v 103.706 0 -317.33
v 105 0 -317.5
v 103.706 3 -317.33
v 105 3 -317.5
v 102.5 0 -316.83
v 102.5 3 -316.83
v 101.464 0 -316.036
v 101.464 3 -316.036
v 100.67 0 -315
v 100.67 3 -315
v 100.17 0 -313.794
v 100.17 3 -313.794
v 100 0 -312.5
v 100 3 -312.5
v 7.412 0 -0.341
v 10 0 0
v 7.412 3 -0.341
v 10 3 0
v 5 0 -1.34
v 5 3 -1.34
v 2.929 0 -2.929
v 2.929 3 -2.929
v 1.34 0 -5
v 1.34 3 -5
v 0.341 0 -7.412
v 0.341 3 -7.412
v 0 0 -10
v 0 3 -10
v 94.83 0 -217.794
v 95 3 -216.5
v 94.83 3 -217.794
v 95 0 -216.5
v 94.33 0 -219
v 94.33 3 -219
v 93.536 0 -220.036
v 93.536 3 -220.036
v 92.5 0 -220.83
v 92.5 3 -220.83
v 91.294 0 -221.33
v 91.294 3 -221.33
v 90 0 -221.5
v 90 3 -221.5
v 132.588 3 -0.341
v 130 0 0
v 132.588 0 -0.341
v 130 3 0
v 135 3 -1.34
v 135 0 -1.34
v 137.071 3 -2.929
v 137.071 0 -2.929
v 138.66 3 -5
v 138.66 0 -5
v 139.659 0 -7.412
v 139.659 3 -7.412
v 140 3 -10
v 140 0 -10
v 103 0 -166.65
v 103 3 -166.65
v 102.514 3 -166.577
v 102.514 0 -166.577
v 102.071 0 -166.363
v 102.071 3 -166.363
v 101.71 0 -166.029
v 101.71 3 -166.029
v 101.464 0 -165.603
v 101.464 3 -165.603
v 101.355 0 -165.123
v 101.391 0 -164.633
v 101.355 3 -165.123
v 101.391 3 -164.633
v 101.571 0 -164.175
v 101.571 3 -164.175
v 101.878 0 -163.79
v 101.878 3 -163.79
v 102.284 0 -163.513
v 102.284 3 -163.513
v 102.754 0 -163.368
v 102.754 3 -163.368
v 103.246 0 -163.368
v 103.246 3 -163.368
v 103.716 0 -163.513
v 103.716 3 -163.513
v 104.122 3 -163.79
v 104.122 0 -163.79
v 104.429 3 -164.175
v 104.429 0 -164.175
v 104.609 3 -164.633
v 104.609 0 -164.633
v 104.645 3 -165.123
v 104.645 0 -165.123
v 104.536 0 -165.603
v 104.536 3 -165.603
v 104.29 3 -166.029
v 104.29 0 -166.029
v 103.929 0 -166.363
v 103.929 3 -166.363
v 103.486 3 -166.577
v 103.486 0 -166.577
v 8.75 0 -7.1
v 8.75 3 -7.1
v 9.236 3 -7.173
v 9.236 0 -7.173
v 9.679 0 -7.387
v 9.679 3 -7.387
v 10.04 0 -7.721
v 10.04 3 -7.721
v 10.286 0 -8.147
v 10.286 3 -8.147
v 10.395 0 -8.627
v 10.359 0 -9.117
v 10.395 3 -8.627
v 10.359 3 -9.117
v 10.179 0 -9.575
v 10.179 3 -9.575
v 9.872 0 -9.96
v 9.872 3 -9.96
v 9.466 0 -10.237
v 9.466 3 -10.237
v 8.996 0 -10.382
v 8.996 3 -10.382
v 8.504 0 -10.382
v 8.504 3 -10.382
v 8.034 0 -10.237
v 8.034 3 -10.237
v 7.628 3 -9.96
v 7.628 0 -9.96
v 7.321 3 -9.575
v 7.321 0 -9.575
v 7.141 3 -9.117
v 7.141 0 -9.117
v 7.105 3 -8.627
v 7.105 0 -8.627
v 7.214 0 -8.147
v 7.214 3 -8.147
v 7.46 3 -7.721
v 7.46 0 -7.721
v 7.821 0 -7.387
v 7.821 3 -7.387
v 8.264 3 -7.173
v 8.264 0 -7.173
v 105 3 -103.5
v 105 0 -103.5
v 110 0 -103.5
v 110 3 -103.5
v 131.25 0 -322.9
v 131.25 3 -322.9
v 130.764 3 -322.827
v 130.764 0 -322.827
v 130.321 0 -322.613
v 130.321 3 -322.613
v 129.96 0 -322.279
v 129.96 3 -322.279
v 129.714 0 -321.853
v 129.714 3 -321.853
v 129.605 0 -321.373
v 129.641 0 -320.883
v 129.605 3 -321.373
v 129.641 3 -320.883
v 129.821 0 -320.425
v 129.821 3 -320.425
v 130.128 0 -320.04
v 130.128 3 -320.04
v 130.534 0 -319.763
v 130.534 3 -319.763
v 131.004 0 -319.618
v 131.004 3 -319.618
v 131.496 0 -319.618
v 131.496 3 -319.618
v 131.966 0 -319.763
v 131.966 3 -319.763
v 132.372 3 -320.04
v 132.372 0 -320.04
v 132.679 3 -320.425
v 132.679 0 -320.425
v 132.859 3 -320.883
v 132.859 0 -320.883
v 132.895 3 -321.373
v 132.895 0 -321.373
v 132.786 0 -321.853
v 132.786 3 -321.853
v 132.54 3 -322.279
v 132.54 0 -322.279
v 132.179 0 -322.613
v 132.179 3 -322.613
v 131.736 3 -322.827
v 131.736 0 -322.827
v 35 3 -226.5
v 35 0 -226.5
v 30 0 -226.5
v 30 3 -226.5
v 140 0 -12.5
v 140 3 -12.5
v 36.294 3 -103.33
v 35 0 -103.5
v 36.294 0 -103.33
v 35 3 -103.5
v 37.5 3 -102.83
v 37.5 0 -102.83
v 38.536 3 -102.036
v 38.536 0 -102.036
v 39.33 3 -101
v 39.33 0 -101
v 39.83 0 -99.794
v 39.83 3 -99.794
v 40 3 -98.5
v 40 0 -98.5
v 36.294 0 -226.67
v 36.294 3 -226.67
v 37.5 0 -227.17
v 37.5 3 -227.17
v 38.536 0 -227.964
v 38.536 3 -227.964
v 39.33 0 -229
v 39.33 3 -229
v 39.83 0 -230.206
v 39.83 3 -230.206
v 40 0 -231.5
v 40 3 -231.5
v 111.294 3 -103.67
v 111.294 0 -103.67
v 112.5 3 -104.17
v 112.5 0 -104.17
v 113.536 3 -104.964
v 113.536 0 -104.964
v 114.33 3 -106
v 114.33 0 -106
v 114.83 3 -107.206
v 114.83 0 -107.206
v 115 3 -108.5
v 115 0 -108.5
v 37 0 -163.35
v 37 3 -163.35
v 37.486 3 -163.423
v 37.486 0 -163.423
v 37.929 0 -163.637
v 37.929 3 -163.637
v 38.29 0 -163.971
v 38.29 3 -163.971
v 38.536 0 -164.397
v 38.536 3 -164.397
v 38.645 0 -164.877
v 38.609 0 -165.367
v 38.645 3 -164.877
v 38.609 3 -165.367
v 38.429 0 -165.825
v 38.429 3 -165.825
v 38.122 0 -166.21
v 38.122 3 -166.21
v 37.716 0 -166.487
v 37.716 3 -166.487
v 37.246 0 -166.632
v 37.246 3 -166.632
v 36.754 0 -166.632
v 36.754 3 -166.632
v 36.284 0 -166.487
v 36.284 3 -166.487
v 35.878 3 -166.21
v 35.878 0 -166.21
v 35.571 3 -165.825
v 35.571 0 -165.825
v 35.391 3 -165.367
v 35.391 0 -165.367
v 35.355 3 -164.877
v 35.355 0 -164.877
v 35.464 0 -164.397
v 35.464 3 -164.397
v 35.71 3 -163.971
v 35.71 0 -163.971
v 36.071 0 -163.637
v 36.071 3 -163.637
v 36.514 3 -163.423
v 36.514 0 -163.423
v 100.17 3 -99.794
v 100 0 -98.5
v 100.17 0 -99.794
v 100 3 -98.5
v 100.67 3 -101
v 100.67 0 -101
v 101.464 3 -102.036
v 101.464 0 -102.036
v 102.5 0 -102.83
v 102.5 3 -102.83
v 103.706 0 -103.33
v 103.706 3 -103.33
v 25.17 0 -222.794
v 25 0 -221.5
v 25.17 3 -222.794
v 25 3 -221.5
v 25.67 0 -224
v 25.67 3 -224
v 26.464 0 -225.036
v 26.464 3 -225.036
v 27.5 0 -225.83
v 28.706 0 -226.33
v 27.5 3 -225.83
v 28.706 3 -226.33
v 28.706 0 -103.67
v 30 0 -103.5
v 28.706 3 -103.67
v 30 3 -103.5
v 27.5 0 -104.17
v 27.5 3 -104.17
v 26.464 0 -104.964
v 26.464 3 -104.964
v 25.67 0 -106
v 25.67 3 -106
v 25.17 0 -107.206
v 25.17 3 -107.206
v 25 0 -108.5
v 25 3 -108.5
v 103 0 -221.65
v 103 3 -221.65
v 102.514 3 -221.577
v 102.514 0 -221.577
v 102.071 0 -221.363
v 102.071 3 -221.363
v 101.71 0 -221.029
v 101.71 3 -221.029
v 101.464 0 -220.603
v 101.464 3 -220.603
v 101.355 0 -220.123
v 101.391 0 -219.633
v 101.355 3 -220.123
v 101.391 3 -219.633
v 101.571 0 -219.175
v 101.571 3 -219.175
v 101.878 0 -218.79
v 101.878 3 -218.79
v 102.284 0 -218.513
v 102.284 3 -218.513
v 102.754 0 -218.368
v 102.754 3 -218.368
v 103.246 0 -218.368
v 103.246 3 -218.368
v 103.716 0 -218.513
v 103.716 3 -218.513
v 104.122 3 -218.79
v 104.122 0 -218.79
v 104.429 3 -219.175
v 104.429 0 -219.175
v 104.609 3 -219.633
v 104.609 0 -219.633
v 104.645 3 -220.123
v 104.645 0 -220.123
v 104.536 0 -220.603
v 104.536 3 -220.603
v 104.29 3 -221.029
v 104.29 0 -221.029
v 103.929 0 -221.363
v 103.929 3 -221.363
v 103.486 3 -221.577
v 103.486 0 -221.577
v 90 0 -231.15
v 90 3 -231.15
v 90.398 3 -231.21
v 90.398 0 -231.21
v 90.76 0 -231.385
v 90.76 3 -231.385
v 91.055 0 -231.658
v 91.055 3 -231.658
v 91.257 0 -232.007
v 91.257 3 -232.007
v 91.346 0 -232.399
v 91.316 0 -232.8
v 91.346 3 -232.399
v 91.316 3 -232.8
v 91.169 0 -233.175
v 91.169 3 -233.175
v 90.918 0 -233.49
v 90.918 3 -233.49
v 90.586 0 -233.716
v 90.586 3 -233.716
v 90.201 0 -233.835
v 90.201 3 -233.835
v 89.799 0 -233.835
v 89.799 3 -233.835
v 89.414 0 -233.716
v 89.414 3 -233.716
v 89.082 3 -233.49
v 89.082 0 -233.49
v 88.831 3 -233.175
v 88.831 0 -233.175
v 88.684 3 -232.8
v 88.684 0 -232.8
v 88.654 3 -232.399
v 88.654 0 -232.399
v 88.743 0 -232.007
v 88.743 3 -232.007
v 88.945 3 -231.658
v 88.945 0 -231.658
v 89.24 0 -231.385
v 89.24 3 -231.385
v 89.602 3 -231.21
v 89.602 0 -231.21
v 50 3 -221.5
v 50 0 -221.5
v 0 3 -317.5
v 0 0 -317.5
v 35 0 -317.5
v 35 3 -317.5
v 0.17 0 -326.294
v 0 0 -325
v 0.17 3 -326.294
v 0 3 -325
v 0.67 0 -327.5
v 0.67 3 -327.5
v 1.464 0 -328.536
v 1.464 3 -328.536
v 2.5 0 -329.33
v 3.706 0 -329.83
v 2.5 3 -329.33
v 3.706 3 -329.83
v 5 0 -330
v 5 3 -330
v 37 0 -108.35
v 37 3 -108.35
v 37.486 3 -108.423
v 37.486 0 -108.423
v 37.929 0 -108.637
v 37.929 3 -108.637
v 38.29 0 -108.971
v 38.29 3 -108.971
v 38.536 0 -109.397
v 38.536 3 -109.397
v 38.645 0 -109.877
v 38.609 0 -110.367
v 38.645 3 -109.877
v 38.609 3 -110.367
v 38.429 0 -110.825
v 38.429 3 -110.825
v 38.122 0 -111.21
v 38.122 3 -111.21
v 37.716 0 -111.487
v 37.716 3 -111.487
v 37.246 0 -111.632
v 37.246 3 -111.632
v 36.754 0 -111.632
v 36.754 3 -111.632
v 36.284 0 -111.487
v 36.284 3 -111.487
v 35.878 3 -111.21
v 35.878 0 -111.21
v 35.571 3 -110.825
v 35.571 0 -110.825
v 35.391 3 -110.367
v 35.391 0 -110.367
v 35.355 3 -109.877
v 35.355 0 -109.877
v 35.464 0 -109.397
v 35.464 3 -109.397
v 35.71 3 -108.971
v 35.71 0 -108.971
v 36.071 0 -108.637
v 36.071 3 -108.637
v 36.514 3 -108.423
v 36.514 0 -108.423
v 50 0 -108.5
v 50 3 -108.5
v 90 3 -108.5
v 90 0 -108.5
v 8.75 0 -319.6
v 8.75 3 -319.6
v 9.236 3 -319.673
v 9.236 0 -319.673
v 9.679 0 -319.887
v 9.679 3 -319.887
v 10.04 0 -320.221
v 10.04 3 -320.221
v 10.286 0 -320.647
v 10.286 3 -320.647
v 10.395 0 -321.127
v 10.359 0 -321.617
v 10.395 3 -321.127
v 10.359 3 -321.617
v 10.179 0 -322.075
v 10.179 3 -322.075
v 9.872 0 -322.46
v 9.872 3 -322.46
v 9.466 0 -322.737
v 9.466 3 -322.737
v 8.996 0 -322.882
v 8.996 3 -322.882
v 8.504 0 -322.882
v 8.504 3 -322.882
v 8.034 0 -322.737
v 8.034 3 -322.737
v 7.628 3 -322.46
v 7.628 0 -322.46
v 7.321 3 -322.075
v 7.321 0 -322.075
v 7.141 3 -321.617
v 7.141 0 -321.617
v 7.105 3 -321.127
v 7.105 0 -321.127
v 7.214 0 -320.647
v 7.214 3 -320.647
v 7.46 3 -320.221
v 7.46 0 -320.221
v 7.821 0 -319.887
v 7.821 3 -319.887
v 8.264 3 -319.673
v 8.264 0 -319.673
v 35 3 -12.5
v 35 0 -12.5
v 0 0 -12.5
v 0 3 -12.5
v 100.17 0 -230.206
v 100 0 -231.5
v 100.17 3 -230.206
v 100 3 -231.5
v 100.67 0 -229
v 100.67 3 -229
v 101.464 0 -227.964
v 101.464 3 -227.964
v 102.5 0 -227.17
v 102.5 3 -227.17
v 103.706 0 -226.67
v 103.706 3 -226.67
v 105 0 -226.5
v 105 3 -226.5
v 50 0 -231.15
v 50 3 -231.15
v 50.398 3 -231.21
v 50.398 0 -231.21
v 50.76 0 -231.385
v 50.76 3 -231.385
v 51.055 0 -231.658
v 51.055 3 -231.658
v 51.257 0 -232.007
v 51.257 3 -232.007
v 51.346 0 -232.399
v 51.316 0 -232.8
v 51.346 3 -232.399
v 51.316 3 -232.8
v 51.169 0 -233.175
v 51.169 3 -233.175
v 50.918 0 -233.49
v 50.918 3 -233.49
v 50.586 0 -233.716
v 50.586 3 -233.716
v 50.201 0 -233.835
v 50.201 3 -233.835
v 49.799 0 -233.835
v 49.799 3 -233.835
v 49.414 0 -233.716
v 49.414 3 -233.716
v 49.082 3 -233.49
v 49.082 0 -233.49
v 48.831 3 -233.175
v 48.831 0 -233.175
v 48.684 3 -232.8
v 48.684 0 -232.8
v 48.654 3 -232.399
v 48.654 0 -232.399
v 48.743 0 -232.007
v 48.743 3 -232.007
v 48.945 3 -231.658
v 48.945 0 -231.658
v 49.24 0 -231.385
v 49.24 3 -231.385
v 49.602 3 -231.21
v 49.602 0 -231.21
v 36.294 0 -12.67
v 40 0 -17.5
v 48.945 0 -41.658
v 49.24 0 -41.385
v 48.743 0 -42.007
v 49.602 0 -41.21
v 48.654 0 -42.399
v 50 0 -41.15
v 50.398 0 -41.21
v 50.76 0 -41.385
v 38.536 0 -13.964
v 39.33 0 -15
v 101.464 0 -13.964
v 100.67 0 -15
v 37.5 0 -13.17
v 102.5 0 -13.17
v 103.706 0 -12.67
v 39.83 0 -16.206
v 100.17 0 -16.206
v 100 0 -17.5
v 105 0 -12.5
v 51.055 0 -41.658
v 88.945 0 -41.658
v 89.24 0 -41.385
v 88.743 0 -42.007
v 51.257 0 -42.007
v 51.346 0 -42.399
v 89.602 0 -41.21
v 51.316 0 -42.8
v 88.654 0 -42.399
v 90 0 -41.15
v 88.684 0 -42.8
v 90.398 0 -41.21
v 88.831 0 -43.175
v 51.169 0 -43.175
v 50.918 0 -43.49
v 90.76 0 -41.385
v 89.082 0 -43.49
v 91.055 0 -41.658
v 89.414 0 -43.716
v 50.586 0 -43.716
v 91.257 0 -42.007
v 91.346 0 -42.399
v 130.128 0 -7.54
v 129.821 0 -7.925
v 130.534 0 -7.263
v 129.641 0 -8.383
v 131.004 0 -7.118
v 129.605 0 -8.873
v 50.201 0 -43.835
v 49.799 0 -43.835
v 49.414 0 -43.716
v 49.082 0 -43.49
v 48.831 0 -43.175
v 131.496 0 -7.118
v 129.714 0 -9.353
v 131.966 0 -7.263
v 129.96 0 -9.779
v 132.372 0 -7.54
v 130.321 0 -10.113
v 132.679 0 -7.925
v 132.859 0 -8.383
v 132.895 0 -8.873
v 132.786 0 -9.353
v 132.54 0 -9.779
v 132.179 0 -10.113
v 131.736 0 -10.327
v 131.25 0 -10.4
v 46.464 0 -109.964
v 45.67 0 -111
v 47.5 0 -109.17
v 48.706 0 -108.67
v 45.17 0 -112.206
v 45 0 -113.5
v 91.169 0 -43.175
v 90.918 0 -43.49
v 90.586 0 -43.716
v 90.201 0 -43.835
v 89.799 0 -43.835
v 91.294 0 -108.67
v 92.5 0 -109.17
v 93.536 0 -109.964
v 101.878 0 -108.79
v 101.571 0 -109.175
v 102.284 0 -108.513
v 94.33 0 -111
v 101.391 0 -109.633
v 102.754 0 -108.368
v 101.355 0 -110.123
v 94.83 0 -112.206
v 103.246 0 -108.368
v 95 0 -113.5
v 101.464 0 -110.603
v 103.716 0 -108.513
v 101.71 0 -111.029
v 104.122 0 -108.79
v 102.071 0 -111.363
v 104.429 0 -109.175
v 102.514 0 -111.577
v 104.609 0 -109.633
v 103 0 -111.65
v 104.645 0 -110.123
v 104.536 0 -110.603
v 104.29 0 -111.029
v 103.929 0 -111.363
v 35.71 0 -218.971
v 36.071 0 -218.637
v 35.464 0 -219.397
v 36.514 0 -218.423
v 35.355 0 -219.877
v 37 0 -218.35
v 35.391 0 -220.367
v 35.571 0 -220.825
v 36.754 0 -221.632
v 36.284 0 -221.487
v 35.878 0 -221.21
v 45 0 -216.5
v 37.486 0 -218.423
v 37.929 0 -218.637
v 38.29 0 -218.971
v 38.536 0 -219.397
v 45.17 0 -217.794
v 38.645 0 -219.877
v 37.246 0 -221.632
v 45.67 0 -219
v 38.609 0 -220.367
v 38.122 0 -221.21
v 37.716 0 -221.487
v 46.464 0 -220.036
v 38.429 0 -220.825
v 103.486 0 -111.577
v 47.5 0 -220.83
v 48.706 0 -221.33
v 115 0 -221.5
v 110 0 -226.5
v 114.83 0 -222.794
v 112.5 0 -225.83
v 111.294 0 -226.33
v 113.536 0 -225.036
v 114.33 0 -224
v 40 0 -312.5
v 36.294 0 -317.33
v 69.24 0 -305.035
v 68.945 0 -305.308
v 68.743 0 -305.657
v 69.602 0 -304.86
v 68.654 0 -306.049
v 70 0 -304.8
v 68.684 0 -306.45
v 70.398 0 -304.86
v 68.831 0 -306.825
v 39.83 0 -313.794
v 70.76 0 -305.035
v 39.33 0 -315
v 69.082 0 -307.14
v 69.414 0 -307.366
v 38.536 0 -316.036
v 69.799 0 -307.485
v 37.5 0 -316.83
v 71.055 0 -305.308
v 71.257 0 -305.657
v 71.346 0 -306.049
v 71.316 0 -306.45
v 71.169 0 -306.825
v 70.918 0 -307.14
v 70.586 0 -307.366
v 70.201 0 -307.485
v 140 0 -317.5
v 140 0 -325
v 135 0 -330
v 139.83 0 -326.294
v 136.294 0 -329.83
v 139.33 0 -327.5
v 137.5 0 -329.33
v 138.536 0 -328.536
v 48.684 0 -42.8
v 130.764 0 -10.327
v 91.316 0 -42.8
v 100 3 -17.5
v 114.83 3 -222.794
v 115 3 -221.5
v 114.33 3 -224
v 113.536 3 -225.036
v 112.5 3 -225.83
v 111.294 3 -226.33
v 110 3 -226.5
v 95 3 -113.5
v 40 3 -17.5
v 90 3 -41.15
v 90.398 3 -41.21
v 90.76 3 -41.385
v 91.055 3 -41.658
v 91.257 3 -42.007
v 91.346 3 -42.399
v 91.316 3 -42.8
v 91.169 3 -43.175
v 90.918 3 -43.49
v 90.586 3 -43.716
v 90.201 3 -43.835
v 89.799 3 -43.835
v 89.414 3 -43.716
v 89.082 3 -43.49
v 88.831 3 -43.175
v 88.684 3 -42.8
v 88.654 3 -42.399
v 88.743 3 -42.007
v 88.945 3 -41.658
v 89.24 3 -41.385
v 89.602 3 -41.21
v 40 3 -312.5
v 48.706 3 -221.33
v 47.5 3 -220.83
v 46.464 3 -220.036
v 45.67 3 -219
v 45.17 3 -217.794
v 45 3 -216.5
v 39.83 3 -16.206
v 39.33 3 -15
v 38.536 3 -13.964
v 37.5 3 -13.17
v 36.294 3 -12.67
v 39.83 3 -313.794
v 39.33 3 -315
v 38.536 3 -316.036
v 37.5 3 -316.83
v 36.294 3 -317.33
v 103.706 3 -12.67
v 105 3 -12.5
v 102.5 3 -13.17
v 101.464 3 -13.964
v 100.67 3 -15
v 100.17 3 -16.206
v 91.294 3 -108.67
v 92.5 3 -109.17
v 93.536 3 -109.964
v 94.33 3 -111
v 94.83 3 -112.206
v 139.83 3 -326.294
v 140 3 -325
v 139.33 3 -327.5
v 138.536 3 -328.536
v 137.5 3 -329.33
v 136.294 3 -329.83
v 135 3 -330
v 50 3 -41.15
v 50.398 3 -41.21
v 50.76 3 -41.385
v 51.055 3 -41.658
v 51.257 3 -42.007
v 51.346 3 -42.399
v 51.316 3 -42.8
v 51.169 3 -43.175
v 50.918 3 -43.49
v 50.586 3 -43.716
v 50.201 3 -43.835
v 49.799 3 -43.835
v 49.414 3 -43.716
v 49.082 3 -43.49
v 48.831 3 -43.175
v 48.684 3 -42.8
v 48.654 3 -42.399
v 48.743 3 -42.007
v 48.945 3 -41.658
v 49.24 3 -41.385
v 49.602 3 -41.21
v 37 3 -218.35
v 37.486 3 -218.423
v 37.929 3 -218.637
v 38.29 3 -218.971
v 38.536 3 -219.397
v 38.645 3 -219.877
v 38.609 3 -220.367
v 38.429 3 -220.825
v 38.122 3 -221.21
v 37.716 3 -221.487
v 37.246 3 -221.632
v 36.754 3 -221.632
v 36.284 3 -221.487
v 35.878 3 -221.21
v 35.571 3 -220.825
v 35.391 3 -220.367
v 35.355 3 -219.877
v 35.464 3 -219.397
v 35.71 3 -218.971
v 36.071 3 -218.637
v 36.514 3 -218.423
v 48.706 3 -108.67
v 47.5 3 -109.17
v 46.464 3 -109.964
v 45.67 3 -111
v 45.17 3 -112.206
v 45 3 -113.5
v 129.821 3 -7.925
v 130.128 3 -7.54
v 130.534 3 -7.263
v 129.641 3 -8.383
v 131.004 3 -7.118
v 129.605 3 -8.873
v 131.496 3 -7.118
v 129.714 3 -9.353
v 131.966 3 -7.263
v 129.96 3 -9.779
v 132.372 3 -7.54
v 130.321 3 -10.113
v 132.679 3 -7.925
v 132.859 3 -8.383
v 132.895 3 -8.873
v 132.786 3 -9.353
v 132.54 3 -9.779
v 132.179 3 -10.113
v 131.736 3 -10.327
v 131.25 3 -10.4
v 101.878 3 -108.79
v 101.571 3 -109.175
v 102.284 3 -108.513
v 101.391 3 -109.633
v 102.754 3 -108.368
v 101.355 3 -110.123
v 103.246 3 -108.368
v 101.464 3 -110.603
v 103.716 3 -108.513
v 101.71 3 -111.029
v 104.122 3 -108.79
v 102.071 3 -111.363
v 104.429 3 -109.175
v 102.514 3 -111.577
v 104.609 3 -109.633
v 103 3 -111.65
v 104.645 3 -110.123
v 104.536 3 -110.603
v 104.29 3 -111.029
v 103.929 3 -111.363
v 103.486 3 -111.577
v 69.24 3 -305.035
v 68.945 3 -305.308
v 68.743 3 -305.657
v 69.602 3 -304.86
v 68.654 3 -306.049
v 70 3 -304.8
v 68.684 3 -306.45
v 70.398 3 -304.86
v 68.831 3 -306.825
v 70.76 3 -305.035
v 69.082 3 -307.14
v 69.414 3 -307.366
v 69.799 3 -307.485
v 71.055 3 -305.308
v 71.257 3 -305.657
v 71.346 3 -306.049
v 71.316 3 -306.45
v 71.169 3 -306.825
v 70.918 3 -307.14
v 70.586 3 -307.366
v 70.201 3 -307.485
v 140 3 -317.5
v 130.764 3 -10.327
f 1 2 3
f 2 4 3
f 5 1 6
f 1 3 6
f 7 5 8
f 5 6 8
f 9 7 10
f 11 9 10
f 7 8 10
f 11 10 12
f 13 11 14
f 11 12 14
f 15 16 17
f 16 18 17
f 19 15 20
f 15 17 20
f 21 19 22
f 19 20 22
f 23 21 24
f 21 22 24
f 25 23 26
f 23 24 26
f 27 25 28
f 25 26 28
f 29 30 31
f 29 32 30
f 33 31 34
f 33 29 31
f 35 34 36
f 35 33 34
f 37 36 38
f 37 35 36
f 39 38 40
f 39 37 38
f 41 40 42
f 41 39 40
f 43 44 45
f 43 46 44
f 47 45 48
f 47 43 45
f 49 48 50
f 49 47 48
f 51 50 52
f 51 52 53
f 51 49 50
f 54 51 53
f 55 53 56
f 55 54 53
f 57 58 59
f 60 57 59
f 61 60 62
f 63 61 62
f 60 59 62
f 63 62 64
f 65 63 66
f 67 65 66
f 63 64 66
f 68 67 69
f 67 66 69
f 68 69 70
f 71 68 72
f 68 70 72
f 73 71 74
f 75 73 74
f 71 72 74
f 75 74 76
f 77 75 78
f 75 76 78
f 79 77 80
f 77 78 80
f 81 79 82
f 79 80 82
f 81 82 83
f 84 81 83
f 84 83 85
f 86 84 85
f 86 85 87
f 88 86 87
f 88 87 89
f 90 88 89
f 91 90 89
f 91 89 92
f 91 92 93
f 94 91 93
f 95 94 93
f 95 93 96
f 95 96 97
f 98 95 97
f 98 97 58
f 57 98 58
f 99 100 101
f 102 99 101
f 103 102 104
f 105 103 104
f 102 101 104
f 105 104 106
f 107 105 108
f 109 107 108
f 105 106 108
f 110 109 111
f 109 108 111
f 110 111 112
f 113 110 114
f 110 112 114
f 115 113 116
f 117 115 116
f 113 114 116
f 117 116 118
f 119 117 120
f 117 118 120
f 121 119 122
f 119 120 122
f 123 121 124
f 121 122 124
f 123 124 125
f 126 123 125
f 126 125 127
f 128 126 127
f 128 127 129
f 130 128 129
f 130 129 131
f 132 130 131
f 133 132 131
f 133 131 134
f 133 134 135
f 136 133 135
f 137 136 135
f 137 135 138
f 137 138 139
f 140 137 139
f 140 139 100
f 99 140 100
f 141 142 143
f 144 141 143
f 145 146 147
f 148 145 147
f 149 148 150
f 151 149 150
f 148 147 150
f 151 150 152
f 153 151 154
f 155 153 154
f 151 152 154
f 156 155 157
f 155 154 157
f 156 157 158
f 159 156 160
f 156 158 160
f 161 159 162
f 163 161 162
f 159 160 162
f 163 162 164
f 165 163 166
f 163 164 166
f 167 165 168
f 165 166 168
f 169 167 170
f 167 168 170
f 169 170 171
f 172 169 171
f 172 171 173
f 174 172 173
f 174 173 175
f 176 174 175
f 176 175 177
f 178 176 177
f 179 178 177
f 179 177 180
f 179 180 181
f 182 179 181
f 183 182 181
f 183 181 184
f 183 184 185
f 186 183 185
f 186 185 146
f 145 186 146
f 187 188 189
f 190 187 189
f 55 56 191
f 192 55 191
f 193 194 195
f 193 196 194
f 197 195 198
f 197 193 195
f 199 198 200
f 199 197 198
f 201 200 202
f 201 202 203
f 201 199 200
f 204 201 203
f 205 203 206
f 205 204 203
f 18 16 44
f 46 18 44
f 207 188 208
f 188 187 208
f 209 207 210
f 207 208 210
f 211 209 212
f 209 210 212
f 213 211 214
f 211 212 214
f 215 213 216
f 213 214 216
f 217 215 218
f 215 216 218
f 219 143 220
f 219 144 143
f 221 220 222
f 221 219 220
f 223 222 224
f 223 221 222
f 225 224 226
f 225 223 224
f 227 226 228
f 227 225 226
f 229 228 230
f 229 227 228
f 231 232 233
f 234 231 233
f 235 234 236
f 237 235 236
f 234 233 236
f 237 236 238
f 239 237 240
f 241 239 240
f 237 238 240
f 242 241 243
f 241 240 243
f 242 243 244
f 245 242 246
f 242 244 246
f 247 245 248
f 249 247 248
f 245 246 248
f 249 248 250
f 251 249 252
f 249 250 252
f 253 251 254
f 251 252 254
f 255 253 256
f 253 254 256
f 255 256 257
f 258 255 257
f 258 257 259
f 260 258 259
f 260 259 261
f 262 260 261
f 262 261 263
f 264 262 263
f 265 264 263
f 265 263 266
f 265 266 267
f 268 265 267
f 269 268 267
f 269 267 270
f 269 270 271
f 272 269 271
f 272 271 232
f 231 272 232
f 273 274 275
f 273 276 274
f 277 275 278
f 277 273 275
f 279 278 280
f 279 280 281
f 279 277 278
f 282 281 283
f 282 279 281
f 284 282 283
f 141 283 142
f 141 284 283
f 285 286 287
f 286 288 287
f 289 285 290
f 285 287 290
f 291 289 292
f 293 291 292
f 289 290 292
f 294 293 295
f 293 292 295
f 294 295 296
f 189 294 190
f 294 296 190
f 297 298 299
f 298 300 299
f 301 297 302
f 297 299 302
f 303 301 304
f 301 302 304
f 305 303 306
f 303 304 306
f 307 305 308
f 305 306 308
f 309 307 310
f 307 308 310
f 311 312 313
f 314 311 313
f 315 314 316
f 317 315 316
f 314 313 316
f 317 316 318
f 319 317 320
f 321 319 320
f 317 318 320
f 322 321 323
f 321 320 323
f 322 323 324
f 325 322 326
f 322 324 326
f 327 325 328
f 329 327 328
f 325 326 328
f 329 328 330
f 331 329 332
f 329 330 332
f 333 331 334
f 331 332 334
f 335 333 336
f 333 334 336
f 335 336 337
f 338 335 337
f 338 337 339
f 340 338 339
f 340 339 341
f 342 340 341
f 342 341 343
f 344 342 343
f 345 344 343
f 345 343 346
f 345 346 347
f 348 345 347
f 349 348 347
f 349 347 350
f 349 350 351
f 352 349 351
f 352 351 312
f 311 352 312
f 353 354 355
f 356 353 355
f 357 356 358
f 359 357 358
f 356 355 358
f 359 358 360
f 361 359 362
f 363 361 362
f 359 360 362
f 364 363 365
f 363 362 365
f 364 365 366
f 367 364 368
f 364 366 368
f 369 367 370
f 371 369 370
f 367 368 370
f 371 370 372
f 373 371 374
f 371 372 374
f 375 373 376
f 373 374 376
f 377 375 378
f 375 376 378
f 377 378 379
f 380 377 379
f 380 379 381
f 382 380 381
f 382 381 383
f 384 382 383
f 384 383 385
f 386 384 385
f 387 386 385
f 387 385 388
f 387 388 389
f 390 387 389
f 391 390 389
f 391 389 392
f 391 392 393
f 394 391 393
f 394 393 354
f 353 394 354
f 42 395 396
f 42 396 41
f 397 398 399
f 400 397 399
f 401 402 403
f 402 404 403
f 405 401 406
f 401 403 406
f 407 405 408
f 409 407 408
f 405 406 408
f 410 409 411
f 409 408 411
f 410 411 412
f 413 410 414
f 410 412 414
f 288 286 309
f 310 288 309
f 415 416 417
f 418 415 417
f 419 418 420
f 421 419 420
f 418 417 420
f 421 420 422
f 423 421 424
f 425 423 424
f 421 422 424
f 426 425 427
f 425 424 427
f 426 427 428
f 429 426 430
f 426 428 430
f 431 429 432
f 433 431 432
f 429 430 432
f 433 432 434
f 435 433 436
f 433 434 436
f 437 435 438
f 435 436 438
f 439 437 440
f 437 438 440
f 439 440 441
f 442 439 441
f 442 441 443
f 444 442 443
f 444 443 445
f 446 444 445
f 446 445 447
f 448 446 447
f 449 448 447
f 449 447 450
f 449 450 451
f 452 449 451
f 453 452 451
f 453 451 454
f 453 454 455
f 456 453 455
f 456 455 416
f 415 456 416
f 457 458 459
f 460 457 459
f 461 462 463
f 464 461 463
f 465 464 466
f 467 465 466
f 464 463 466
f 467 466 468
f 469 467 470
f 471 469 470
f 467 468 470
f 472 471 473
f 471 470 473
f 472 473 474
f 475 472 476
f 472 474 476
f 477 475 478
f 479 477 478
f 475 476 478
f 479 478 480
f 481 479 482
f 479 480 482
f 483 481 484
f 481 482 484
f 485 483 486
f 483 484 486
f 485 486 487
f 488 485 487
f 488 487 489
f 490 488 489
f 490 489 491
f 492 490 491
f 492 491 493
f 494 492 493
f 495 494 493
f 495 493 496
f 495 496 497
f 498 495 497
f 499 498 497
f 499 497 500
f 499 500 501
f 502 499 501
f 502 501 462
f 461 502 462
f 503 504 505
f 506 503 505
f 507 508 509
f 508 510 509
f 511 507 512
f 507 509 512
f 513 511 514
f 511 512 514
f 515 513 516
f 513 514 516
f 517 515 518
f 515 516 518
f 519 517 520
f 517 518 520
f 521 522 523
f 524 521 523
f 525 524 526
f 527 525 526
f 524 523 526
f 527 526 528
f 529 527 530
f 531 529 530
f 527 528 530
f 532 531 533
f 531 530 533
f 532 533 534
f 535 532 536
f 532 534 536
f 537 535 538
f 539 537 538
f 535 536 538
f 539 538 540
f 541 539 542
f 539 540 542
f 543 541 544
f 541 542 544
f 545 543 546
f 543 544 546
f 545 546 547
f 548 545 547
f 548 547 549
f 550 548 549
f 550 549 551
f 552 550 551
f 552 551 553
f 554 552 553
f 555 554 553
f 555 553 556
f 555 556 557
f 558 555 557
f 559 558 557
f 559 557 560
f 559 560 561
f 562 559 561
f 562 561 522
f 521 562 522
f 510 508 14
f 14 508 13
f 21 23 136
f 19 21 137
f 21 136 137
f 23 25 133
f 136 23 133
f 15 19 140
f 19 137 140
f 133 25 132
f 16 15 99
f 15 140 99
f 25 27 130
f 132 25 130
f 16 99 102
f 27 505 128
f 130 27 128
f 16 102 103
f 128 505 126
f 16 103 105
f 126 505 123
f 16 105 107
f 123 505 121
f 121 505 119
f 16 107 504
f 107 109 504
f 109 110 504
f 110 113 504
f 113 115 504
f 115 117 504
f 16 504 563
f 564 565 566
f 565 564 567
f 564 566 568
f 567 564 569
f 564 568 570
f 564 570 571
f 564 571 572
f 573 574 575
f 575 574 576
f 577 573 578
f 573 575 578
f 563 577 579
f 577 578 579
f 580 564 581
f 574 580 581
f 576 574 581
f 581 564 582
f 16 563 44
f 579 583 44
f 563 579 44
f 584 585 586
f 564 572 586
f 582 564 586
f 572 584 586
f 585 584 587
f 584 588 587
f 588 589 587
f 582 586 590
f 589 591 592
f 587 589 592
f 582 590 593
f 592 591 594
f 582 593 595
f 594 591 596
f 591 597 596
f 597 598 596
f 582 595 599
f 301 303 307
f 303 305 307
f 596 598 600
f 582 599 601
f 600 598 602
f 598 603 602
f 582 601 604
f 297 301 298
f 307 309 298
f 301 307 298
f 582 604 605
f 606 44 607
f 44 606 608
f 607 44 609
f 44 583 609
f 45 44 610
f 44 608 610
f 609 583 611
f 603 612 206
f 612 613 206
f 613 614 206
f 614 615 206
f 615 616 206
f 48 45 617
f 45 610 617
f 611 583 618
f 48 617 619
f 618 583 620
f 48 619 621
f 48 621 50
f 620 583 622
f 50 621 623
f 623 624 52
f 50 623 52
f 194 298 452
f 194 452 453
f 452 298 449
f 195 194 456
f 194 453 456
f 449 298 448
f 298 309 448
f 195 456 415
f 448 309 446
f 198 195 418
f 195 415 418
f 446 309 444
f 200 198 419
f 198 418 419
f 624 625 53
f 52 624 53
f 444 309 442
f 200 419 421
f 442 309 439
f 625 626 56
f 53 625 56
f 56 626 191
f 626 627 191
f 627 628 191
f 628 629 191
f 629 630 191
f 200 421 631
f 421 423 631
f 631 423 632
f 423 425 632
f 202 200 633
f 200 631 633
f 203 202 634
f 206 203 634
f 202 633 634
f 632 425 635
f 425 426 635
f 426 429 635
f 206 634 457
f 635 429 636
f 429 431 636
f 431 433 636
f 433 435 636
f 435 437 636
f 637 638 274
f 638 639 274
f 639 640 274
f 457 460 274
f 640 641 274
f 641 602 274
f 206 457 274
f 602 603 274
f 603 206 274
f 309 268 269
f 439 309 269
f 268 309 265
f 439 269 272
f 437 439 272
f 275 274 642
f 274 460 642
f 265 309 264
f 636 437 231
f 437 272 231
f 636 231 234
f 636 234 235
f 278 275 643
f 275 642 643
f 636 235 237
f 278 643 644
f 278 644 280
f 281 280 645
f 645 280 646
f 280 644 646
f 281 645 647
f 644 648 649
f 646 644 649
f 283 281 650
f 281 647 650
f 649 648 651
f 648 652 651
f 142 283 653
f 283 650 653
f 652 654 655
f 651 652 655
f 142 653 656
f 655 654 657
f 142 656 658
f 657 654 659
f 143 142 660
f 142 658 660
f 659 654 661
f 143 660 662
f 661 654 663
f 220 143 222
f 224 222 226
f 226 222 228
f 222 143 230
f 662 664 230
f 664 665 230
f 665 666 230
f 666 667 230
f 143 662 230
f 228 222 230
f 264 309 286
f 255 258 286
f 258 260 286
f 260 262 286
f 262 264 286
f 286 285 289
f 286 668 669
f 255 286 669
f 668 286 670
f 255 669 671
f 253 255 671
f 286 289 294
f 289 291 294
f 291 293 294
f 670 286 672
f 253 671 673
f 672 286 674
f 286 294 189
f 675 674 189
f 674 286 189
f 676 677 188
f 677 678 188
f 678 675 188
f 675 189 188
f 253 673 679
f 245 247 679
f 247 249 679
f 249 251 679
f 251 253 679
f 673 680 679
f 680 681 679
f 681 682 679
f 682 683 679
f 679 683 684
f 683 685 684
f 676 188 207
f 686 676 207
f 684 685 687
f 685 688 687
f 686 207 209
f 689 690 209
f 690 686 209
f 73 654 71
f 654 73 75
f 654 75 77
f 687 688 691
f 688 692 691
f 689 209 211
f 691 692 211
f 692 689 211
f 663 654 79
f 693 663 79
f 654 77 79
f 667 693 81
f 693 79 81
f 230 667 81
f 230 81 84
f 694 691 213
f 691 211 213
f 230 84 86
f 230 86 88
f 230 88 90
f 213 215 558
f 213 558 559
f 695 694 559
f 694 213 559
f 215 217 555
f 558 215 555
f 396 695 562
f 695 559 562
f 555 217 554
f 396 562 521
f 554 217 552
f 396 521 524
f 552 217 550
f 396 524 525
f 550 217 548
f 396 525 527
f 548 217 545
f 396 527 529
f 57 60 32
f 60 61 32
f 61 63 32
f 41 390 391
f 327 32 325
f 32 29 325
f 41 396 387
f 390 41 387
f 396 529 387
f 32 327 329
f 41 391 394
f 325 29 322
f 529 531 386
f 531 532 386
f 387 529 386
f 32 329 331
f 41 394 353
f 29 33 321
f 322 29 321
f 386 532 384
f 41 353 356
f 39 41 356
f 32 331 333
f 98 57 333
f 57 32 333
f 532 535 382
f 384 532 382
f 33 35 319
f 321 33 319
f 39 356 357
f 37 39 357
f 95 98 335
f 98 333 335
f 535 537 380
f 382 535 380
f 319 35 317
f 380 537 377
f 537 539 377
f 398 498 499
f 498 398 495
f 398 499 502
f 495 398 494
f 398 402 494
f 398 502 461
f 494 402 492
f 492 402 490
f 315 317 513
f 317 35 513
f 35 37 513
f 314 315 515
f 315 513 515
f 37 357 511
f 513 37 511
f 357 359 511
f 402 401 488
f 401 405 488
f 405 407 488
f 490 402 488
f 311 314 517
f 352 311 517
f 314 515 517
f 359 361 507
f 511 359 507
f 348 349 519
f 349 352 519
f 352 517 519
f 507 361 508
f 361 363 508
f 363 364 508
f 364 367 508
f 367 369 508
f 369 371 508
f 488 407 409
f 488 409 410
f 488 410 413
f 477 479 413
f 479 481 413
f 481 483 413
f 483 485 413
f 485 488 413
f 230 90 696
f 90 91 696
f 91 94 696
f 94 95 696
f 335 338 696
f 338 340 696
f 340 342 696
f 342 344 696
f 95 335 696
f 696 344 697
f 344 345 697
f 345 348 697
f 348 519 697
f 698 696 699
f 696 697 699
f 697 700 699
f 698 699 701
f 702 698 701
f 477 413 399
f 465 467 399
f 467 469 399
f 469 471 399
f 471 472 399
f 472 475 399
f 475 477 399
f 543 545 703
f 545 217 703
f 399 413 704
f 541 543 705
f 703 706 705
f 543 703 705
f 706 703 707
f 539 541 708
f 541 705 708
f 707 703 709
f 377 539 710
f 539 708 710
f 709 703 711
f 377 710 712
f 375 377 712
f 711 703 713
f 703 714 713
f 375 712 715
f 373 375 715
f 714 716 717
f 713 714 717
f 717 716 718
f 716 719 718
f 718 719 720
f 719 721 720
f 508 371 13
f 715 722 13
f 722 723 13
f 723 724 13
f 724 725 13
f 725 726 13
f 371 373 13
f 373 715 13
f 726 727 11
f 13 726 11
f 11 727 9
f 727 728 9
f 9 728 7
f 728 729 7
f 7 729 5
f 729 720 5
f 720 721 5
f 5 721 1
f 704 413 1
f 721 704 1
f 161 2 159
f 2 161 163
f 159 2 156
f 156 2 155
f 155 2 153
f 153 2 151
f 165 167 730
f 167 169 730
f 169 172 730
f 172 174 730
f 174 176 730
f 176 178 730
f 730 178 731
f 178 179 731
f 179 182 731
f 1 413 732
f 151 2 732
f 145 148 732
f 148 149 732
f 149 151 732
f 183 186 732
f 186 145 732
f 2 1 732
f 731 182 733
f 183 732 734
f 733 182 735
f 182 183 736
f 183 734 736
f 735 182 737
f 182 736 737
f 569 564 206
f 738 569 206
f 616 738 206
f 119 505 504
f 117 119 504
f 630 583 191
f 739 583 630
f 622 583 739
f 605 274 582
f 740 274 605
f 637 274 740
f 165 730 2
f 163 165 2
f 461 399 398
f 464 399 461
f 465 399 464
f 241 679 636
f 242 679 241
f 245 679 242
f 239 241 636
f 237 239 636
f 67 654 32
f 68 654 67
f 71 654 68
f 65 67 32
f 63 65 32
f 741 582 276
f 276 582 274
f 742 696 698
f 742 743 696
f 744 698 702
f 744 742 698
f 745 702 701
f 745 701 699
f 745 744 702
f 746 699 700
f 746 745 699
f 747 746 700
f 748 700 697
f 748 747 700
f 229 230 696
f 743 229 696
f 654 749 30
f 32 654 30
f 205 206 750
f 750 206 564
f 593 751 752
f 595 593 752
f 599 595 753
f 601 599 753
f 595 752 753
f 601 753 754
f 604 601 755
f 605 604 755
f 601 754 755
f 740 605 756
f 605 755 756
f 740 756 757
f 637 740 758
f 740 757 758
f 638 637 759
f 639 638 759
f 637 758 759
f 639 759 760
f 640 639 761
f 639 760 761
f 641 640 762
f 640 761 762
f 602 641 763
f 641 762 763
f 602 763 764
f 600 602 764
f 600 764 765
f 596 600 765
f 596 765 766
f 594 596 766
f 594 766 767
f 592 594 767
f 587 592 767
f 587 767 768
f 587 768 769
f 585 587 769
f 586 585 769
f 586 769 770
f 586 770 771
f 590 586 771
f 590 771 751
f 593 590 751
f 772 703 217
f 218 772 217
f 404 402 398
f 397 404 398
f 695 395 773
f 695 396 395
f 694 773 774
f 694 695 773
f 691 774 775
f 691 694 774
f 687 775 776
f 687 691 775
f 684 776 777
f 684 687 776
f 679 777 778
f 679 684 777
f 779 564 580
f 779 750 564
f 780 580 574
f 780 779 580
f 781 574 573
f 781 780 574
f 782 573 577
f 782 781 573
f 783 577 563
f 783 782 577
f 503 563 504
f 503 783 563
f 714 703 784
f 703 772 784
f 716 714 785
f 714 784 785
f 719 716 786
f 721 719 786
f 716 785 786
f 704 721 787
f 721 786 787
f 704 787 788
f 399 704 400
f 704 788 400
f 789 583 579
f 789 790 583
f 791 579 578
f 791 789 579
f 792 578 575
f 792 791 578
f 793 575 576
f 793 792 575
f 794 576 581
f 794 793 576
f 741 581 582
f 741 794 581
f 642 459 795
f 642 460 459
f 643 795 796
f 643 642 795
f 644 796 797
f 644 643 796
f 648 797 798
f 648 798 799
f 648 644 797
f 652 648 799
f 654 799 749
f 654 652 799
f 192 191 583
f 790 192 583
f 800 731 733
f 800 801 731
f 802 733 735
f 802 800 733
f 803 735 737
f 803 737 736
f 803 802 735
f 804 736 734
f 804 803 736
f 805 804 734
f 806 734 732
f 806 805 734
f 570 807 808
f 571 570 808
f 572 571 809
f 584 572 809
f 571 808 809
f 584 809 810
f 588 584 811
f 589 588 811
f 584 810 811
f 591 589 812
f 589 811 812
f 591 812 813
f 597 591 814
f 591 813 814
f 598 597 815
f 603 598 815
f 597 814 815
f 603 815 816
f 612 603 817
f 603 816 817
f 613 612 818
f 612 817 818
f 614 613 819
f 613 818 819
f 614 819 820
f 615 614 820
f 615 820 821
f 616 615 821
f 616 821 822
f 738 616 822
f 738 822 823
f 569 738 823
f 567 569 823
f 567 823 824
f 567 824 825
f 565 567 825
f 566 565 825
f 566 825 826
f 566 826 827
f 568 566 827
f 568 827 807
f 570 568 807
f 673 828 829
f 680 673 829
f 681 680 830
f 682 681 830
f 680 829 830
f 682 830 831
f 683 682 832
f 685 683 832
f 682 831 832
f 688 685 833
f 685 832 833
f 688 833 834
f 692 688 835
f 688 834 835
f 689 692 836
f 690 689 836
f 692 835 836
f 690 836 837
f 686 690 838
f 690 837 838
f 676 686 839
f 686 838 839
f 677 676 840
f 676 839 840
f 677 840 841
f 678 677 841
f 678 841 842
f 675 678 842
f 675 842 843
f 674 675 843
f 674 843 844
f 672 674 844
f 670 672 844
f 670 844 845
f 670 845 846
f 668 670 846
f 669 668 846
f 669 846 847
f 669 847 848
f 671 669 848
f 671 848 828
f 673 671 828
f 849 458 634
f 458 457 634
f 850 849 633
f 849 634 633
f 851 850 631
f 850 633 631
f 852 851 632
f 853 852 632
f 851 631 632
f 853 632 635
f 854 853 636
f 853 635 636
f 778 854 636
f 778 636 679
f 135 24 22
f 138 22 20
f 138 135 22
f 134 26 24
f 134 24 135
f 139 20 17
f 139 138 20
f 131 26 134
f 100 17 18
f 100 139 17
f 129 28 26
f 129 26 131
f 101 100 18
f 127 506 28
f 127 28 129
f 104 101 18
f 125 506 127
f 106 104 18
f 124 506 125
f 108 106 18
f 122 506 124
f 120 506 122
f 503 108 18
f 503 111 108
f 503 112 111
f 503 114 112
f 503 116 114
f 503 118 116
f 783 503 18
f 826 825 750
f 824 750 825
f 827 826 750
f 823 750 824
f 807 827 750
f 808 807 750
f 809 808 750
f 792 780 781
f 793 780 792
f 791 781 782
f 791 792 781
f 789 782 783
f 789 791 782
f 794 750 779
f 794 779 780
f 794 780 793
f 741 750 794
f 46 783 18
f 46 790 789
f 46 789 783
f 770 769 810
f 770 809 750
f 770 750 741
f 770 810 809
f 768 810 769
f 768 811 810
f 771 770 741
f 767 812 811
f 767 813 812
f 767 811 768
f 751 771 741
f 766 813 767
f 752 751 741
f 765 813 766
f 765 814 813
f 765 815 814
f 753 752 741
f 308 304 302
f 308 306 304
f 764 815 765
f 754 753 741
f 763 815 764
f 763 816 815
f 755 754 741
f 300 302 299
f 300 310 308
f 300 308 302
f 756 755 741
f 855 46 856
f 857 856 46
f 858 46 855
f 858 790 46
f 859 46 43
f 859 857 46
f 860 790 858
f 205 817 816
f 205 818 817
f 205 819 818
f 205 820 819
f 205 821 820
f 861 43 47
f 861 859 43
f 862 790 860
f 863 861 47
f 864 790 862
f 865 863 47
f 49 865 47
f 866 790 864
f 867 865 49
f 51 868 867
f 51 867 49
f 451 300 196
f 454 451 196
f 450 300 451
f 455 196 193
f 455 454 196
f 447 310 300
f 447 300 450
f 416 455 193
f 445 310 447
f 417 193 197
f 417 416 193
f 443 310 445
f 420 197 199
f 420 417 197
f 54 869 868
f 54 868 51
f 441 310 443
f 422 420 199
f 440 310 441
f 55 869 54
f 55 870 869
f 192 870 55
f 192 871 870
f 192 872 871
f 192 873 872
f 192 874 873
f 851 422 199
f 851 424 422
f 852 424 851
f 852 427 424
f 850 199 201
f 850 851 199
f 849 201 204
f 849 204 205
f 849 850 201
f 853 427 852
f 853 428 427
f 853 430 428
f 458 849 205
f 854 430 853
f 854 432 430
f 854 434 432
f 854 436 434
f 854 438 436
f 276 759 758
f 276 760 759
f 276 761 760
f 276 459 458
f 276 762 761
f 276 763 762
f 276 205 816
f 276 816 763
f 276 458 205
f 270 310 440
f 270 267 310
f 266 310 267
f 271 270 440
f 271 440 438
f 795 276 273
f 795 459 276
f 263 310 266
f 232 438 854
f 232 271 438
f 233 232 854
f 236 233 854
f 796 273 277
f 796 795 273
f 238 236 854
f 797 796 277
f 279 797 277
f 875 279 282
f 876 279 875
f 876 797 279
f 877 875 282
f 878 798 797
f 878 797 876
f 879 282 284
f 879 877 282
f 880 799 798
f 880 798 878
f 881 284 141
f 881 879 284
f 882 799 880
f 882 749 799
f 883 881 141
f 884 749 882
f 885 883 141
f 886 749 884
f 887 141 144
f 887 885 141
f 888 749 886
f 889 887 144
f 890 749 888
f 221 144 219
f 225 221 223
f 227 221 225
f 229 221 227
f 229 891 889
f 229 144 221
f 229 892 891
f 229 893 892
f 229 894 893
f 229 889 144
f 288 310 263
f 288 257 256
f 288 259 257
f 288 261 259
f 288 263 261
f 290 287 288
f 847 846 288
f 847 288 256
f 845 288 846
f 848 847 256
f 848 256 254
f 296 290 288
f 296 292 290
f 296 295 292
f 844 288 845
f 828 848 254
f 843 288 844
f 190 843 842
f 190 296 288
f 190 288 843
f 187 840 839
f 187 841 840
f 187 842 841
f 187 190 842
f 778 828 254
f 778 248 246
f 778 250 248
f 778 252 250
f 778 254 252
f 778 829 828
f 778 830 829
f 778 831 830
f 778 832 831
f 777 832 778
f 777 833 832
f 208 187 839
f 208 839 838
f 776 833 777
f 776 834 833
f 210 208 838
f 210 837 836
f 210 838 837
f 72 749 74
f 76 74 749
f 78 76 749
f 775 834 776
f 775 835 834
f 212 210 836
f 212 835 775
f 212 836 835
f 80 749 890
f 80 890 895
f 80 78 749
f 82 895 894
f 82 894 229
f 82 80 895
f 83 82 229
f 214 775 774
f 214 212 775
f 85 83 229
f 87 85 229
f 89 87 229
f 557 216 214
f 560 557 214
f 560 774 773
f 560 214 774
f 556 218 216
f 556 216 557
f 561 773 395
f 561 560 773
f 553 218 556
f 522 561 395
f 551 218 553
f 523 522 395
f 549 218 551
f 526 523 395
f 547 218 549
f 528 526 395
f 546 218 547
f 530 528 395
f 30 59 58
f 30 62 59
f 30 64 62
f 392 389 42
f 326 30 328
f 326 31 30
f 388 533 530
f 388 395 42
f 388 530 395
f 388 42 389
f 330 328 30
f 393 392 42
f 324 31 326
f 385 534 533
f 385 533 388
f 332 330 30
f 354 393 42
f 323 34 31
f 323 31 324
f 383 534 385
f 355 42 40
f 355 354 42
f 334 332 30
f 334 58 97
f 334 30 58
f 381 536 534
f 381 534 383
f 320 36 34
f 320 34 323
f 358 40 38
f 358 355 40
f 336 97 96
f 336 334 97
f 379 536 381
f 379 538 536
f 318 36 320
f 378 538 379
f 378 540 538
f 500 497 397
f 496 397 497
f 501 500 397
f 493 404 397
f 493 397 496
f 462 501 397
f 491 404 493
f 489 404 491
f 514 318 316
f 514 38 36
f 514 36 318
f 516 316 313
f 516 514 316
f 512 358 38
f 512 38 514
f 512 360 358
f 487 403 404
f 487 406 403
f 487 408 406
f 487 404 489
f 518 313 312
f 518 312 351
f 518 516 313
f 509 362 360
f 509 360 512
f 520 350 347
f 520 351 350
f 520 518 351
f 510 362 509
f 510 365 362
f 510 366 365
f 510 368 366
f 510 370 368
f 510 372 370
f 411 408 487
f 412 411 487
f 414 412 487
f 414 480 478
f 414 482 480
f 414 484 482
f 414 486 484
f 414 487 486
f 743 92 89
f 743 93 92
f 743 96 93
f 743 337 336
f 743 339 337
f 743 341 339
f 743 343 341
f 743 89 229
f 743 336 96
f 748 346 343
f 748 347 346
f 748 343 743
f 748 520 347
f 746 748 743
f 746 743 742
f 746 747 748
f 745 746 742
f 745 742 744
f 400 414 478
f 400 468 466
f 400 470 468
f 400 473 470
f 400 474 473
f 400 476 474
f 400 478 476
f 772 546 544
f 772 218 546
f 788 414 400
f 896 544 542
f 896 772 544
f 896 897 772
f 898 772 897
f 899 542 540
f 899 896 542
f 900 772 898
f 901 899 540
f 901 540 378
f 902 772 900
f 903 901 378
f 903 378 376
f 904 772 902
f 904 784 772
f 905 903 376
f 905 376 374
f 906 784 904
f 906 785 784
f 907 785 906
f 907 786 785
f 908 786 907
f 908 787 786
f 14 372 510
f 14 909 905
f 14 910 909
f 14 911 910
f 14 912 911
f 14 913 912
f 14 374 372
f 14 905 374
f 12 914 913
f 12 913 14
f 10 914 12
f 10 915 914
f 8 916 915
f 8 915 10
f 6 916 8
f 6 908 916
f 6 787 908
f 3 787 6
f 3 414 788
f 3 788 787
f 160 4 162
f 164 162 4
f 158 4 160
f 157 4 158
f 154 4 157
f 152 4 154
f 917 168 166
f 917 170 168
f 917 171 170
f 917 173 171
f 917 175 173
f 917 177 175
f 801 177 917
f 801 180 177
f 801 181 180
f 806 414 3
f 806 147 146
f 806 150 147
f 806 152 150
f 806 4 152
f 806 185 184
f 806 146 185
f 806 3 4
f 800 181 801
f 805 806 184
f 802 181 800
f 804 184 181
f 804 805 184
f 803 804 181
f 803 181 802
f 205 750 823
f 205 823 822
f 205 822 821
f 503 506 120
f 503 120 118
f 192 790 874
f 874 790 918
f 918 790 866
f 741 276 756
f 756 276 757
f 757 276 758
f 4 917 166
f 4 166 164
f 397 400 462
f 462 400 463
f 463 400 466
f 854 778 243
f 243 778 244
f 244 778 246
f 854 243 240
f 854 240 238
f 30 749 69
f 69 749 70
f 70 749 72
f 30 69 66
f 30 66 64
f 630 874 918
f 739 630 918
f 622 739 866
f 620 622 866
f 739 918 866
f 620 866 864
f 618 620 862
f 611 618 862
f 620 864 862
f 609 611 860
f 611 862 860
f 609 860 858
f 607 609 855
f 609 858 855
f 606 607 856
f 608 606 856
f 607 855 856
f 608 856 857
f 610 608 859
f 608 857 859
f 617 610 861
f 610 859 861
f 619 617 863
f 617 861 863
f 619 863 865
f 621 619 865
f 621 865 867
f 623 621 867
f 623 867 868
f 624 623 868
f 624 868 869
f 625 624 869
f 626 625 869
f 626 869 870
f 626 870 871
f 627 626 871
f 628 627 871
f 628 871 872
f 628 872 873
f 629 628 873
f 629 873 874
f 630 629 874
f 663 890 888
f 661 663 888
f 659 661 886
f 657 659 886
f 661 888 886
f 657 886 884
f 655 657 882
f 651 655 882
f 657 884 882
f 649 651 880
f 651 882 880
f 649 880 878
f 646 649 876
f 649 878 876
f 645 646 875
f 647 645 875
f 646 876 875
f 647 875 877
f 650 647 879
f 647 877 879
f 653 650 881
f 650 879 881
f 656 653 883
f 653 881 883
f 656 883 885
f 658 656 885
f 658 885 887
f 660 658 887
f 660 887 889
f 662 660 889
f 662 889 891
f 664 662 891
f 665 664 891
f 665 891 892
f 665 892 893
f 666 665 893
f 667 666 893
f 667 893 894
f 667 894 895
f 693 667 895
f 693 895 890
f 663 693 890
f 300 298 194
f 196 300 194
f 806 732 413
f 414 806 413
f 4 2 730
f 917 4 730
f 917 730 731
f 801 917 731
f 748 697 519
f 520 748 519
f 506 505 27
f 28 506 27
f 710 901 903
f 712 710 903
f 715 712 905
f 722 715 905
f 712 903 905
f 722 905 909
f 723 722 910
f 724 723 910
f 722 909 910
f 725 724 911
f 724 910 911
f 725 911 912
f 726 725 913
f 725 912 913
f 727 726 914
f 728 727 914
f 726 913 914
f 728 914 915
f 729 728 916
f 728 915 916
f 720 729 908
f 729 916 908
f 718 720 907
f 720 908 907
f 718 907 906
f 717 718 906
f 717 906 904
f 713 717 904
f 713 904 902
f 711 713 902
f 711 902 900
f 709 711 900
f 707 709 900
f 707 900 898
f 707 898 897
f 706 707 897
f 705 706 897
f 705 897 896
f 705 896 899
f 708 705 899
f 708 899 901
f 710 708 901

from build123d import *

# Parameters (mm, degrees)
BOSS_EXTRUDE1_DEPTH = 3
FILLET1_R           = 10
FILLET2_R           = 5
SKETCH2_R           = 1.65
CUT_EXTRUDE1_DEPTH  = 359.481519747
SKETCH3_R           = 1.65
CUT_EXTRUDE2_DEPTH  = 359.481519747
SKETCH4_R           = 1.65
CUT_EXTRUDE3_DEPTH  = 359.481519747
FILLET3_R           = 5
SKETCH5_R           = 1.35
CUT_EXTRUDE4_DEPTH  = 10
SKETCH6_W           = 50
SKETCH6_H           = 113
CUT_EXTRUDE5_DEPTH  = 10
FILLET4_R           = 5


with BuildPart() as part:
    # Sketch1 → Boss-Extrude1 (new body)
    with BuildSketch(Plane(origin=(0, 0, 0), x_dir=(1, 0, 0), z_dir=(0, 1, 0))):
        Polygon((0, 0), (140, 0), (140, 12.5), (100, 12.5), (100, 103.5), (115, 103.5), (115, 226.5), (100, 226.5), (100, 317.5), (140, 317.5), (140, 330), (0, 330), (0, 317.5), (40, 317.5), (40, 226.5), (25, 226.5), (25, 103.5), (40, 103.5), (40, 12.5), (0, 12.5), align=None)
    extrude(amount=BOSS_EXTRUDE1_DEPTH)

    # Fillet1
    fillet1_edges = [part.edges().sort_by_distance(p)[0] for p in [
        (140, 1.5, 0),
        (0, 1.5, 0),
    ]]
    fillet(fillet1_edges, radius=FILLET1_R)

    # Fillet2
    fillet2_edges = [part.edges().sort_by_distance(p)[0] for p in [
        (25, 1.5, -103.5),
        (25, 1.5, -226.5),
        (0, 1.5, -330),
        (140, 1.5, -330),
        (115, 1.5, -226.5),
        (115, 1.5, -103.5),
    ]]
    fillet(fillet2_edges, radius=FILLET2_R)

    # Sketch2 → Cut-Extrude1 (cut, through all)
    with BuildSketch(Plane(origin=(0, 3, 0), x_dir=(1, 0, 0), z_dir=(0, 1, 0))):
        with Locations(Location((37, 220, 0), (0, 0, 270))):
            Circle(SKETCH2_R)
        with Locations(Location((37, 165, 0), (0, 0, 270))):
            Circle(SKETCH2_R)
        with Locations(Location((37, 110, 0), (0, 0, 270))):
            Circle(SKETCH2_R)
        with Locations(Location((103, 110, 0), (0, 0, 90))):
            Circle(SKETCH2_R)
        with Locations(Location((103, 165, 0), (0, 0, 90))):
            Circle(SKETCH2_R)
        with Locations(Location((103, 220, 0), (0, 0, 90))):
            Circle(SKETCH2_R)
    extrude(amount=-CUT_EXTRUDE1_DEPTH, mode=Mode.SUBTRACT)

    # Sketch3 → Cut-Extrude2 (cut, through all)
    with BuildSketch(Plane(origin=(0, 3, 0), x_dir=(1, 0, 0), z_dir=(0, 1, 0))):
        with Locations(Location((8.75, 8.75, 0), (0, 0, 270))):
            Circle(SKETCH3_R)
        with Locations(Location((131.25, 8.75, 0), (0, 0, 90))):
            Circle(SKETCH3_R)
    extrude(amount=-CUT_EXTRUDE2_DEPTH, mode=Mode.SUBTRACT)

    # Sketch4 → Cut-Extrude3 (cut, through all)
    with BuildSketch(Plane(origin=(0, 3, 0), x_dir=(1, 0, 0), z_dir=(0, 1, 0))):
        with Locations(Location((8.75, 321.25, 0), (0, 0, 270))):
            Circle(SKETCH4_R)
        with Locations(Location((131.25, 321.25, 0), (0, 0, 90))):
            Circle(SKETCH4_R)
    extrude(amount=-CUT_EXTRUDE3_DEPTH, mode=Mode.SUBTRACT)

    # Fillet3
    fillet3_edges = [part.edges().sort_by_distance(p)[0] for p in [
        (40, 1.5, -12.5),
        (40, 1.5, -103.5),
        (40, 1.5, -226.5),
        (40, 1.5, -317.5),
        (100, 1.5, -317.5),
        (100, 1.5, -226.5),
        (100, 1.5, -103.5),
        (100, 1.5, -12.5),
    ]]
    fillet(fillet3_edges, radius=FILLET3_R)

    # Sketch5 → Cut-Extrude4 (cut)
    with BuildSketch(Plane(origin=(0, 3, 0), x_dir=(1, 0, 0), z_dir=(0, 1, 0))):
        with Locations(Location((50, 42.5, 0), (0, 0, 270))):
            Circle(SKETCH5_R)
        with Locations(Location((90, 42.5, 0), (0, 0, 270))):
            Circle(SKETCH5_R)
        with Locations(Location((50, 232.5, 0), (0, 0, 270))):
            Circle(SKETCH5_R)
        with Locations(Location((90, 232.5, 0), (0, 0, 270))):
            Circle(SKETCH5_R)
        with Locations(Location((70, 306.15, 0), (0, 0, 270))):
            Circle(SKETCH5_R)
    extrude(amount=-CUT_EXTRUDE4_DEPTH, mode=Mode.SUBTRACT)

    # Sketch6 → Cut-Extrude5 (cut)
    with BuildSketch(Plane(origin=(0, 3, 0), x_dir=(1, 0, 0), z_dir=(0, 1, 0))):
        with Locations((70, 165)):
            Rectangle(SKETCH6_W, SKETCH6_H)
    extrude(amount=-CUT_EXTRUDE5_DEPTH, mode=Mode.SUBTRACT)

    # Fillet4
    fillet4_edges = [part.edges().sort_by_distance(p)[0] for p in [
        (45, 1.5, -108.5),
        (45, 1.5, -221.5),
        (95, 1.5, -221.5),
        (95, 1.5, -108.5),
    ]]
    fillet(fillet4_edges, radius=FILLET4_R)


solid = part.part
